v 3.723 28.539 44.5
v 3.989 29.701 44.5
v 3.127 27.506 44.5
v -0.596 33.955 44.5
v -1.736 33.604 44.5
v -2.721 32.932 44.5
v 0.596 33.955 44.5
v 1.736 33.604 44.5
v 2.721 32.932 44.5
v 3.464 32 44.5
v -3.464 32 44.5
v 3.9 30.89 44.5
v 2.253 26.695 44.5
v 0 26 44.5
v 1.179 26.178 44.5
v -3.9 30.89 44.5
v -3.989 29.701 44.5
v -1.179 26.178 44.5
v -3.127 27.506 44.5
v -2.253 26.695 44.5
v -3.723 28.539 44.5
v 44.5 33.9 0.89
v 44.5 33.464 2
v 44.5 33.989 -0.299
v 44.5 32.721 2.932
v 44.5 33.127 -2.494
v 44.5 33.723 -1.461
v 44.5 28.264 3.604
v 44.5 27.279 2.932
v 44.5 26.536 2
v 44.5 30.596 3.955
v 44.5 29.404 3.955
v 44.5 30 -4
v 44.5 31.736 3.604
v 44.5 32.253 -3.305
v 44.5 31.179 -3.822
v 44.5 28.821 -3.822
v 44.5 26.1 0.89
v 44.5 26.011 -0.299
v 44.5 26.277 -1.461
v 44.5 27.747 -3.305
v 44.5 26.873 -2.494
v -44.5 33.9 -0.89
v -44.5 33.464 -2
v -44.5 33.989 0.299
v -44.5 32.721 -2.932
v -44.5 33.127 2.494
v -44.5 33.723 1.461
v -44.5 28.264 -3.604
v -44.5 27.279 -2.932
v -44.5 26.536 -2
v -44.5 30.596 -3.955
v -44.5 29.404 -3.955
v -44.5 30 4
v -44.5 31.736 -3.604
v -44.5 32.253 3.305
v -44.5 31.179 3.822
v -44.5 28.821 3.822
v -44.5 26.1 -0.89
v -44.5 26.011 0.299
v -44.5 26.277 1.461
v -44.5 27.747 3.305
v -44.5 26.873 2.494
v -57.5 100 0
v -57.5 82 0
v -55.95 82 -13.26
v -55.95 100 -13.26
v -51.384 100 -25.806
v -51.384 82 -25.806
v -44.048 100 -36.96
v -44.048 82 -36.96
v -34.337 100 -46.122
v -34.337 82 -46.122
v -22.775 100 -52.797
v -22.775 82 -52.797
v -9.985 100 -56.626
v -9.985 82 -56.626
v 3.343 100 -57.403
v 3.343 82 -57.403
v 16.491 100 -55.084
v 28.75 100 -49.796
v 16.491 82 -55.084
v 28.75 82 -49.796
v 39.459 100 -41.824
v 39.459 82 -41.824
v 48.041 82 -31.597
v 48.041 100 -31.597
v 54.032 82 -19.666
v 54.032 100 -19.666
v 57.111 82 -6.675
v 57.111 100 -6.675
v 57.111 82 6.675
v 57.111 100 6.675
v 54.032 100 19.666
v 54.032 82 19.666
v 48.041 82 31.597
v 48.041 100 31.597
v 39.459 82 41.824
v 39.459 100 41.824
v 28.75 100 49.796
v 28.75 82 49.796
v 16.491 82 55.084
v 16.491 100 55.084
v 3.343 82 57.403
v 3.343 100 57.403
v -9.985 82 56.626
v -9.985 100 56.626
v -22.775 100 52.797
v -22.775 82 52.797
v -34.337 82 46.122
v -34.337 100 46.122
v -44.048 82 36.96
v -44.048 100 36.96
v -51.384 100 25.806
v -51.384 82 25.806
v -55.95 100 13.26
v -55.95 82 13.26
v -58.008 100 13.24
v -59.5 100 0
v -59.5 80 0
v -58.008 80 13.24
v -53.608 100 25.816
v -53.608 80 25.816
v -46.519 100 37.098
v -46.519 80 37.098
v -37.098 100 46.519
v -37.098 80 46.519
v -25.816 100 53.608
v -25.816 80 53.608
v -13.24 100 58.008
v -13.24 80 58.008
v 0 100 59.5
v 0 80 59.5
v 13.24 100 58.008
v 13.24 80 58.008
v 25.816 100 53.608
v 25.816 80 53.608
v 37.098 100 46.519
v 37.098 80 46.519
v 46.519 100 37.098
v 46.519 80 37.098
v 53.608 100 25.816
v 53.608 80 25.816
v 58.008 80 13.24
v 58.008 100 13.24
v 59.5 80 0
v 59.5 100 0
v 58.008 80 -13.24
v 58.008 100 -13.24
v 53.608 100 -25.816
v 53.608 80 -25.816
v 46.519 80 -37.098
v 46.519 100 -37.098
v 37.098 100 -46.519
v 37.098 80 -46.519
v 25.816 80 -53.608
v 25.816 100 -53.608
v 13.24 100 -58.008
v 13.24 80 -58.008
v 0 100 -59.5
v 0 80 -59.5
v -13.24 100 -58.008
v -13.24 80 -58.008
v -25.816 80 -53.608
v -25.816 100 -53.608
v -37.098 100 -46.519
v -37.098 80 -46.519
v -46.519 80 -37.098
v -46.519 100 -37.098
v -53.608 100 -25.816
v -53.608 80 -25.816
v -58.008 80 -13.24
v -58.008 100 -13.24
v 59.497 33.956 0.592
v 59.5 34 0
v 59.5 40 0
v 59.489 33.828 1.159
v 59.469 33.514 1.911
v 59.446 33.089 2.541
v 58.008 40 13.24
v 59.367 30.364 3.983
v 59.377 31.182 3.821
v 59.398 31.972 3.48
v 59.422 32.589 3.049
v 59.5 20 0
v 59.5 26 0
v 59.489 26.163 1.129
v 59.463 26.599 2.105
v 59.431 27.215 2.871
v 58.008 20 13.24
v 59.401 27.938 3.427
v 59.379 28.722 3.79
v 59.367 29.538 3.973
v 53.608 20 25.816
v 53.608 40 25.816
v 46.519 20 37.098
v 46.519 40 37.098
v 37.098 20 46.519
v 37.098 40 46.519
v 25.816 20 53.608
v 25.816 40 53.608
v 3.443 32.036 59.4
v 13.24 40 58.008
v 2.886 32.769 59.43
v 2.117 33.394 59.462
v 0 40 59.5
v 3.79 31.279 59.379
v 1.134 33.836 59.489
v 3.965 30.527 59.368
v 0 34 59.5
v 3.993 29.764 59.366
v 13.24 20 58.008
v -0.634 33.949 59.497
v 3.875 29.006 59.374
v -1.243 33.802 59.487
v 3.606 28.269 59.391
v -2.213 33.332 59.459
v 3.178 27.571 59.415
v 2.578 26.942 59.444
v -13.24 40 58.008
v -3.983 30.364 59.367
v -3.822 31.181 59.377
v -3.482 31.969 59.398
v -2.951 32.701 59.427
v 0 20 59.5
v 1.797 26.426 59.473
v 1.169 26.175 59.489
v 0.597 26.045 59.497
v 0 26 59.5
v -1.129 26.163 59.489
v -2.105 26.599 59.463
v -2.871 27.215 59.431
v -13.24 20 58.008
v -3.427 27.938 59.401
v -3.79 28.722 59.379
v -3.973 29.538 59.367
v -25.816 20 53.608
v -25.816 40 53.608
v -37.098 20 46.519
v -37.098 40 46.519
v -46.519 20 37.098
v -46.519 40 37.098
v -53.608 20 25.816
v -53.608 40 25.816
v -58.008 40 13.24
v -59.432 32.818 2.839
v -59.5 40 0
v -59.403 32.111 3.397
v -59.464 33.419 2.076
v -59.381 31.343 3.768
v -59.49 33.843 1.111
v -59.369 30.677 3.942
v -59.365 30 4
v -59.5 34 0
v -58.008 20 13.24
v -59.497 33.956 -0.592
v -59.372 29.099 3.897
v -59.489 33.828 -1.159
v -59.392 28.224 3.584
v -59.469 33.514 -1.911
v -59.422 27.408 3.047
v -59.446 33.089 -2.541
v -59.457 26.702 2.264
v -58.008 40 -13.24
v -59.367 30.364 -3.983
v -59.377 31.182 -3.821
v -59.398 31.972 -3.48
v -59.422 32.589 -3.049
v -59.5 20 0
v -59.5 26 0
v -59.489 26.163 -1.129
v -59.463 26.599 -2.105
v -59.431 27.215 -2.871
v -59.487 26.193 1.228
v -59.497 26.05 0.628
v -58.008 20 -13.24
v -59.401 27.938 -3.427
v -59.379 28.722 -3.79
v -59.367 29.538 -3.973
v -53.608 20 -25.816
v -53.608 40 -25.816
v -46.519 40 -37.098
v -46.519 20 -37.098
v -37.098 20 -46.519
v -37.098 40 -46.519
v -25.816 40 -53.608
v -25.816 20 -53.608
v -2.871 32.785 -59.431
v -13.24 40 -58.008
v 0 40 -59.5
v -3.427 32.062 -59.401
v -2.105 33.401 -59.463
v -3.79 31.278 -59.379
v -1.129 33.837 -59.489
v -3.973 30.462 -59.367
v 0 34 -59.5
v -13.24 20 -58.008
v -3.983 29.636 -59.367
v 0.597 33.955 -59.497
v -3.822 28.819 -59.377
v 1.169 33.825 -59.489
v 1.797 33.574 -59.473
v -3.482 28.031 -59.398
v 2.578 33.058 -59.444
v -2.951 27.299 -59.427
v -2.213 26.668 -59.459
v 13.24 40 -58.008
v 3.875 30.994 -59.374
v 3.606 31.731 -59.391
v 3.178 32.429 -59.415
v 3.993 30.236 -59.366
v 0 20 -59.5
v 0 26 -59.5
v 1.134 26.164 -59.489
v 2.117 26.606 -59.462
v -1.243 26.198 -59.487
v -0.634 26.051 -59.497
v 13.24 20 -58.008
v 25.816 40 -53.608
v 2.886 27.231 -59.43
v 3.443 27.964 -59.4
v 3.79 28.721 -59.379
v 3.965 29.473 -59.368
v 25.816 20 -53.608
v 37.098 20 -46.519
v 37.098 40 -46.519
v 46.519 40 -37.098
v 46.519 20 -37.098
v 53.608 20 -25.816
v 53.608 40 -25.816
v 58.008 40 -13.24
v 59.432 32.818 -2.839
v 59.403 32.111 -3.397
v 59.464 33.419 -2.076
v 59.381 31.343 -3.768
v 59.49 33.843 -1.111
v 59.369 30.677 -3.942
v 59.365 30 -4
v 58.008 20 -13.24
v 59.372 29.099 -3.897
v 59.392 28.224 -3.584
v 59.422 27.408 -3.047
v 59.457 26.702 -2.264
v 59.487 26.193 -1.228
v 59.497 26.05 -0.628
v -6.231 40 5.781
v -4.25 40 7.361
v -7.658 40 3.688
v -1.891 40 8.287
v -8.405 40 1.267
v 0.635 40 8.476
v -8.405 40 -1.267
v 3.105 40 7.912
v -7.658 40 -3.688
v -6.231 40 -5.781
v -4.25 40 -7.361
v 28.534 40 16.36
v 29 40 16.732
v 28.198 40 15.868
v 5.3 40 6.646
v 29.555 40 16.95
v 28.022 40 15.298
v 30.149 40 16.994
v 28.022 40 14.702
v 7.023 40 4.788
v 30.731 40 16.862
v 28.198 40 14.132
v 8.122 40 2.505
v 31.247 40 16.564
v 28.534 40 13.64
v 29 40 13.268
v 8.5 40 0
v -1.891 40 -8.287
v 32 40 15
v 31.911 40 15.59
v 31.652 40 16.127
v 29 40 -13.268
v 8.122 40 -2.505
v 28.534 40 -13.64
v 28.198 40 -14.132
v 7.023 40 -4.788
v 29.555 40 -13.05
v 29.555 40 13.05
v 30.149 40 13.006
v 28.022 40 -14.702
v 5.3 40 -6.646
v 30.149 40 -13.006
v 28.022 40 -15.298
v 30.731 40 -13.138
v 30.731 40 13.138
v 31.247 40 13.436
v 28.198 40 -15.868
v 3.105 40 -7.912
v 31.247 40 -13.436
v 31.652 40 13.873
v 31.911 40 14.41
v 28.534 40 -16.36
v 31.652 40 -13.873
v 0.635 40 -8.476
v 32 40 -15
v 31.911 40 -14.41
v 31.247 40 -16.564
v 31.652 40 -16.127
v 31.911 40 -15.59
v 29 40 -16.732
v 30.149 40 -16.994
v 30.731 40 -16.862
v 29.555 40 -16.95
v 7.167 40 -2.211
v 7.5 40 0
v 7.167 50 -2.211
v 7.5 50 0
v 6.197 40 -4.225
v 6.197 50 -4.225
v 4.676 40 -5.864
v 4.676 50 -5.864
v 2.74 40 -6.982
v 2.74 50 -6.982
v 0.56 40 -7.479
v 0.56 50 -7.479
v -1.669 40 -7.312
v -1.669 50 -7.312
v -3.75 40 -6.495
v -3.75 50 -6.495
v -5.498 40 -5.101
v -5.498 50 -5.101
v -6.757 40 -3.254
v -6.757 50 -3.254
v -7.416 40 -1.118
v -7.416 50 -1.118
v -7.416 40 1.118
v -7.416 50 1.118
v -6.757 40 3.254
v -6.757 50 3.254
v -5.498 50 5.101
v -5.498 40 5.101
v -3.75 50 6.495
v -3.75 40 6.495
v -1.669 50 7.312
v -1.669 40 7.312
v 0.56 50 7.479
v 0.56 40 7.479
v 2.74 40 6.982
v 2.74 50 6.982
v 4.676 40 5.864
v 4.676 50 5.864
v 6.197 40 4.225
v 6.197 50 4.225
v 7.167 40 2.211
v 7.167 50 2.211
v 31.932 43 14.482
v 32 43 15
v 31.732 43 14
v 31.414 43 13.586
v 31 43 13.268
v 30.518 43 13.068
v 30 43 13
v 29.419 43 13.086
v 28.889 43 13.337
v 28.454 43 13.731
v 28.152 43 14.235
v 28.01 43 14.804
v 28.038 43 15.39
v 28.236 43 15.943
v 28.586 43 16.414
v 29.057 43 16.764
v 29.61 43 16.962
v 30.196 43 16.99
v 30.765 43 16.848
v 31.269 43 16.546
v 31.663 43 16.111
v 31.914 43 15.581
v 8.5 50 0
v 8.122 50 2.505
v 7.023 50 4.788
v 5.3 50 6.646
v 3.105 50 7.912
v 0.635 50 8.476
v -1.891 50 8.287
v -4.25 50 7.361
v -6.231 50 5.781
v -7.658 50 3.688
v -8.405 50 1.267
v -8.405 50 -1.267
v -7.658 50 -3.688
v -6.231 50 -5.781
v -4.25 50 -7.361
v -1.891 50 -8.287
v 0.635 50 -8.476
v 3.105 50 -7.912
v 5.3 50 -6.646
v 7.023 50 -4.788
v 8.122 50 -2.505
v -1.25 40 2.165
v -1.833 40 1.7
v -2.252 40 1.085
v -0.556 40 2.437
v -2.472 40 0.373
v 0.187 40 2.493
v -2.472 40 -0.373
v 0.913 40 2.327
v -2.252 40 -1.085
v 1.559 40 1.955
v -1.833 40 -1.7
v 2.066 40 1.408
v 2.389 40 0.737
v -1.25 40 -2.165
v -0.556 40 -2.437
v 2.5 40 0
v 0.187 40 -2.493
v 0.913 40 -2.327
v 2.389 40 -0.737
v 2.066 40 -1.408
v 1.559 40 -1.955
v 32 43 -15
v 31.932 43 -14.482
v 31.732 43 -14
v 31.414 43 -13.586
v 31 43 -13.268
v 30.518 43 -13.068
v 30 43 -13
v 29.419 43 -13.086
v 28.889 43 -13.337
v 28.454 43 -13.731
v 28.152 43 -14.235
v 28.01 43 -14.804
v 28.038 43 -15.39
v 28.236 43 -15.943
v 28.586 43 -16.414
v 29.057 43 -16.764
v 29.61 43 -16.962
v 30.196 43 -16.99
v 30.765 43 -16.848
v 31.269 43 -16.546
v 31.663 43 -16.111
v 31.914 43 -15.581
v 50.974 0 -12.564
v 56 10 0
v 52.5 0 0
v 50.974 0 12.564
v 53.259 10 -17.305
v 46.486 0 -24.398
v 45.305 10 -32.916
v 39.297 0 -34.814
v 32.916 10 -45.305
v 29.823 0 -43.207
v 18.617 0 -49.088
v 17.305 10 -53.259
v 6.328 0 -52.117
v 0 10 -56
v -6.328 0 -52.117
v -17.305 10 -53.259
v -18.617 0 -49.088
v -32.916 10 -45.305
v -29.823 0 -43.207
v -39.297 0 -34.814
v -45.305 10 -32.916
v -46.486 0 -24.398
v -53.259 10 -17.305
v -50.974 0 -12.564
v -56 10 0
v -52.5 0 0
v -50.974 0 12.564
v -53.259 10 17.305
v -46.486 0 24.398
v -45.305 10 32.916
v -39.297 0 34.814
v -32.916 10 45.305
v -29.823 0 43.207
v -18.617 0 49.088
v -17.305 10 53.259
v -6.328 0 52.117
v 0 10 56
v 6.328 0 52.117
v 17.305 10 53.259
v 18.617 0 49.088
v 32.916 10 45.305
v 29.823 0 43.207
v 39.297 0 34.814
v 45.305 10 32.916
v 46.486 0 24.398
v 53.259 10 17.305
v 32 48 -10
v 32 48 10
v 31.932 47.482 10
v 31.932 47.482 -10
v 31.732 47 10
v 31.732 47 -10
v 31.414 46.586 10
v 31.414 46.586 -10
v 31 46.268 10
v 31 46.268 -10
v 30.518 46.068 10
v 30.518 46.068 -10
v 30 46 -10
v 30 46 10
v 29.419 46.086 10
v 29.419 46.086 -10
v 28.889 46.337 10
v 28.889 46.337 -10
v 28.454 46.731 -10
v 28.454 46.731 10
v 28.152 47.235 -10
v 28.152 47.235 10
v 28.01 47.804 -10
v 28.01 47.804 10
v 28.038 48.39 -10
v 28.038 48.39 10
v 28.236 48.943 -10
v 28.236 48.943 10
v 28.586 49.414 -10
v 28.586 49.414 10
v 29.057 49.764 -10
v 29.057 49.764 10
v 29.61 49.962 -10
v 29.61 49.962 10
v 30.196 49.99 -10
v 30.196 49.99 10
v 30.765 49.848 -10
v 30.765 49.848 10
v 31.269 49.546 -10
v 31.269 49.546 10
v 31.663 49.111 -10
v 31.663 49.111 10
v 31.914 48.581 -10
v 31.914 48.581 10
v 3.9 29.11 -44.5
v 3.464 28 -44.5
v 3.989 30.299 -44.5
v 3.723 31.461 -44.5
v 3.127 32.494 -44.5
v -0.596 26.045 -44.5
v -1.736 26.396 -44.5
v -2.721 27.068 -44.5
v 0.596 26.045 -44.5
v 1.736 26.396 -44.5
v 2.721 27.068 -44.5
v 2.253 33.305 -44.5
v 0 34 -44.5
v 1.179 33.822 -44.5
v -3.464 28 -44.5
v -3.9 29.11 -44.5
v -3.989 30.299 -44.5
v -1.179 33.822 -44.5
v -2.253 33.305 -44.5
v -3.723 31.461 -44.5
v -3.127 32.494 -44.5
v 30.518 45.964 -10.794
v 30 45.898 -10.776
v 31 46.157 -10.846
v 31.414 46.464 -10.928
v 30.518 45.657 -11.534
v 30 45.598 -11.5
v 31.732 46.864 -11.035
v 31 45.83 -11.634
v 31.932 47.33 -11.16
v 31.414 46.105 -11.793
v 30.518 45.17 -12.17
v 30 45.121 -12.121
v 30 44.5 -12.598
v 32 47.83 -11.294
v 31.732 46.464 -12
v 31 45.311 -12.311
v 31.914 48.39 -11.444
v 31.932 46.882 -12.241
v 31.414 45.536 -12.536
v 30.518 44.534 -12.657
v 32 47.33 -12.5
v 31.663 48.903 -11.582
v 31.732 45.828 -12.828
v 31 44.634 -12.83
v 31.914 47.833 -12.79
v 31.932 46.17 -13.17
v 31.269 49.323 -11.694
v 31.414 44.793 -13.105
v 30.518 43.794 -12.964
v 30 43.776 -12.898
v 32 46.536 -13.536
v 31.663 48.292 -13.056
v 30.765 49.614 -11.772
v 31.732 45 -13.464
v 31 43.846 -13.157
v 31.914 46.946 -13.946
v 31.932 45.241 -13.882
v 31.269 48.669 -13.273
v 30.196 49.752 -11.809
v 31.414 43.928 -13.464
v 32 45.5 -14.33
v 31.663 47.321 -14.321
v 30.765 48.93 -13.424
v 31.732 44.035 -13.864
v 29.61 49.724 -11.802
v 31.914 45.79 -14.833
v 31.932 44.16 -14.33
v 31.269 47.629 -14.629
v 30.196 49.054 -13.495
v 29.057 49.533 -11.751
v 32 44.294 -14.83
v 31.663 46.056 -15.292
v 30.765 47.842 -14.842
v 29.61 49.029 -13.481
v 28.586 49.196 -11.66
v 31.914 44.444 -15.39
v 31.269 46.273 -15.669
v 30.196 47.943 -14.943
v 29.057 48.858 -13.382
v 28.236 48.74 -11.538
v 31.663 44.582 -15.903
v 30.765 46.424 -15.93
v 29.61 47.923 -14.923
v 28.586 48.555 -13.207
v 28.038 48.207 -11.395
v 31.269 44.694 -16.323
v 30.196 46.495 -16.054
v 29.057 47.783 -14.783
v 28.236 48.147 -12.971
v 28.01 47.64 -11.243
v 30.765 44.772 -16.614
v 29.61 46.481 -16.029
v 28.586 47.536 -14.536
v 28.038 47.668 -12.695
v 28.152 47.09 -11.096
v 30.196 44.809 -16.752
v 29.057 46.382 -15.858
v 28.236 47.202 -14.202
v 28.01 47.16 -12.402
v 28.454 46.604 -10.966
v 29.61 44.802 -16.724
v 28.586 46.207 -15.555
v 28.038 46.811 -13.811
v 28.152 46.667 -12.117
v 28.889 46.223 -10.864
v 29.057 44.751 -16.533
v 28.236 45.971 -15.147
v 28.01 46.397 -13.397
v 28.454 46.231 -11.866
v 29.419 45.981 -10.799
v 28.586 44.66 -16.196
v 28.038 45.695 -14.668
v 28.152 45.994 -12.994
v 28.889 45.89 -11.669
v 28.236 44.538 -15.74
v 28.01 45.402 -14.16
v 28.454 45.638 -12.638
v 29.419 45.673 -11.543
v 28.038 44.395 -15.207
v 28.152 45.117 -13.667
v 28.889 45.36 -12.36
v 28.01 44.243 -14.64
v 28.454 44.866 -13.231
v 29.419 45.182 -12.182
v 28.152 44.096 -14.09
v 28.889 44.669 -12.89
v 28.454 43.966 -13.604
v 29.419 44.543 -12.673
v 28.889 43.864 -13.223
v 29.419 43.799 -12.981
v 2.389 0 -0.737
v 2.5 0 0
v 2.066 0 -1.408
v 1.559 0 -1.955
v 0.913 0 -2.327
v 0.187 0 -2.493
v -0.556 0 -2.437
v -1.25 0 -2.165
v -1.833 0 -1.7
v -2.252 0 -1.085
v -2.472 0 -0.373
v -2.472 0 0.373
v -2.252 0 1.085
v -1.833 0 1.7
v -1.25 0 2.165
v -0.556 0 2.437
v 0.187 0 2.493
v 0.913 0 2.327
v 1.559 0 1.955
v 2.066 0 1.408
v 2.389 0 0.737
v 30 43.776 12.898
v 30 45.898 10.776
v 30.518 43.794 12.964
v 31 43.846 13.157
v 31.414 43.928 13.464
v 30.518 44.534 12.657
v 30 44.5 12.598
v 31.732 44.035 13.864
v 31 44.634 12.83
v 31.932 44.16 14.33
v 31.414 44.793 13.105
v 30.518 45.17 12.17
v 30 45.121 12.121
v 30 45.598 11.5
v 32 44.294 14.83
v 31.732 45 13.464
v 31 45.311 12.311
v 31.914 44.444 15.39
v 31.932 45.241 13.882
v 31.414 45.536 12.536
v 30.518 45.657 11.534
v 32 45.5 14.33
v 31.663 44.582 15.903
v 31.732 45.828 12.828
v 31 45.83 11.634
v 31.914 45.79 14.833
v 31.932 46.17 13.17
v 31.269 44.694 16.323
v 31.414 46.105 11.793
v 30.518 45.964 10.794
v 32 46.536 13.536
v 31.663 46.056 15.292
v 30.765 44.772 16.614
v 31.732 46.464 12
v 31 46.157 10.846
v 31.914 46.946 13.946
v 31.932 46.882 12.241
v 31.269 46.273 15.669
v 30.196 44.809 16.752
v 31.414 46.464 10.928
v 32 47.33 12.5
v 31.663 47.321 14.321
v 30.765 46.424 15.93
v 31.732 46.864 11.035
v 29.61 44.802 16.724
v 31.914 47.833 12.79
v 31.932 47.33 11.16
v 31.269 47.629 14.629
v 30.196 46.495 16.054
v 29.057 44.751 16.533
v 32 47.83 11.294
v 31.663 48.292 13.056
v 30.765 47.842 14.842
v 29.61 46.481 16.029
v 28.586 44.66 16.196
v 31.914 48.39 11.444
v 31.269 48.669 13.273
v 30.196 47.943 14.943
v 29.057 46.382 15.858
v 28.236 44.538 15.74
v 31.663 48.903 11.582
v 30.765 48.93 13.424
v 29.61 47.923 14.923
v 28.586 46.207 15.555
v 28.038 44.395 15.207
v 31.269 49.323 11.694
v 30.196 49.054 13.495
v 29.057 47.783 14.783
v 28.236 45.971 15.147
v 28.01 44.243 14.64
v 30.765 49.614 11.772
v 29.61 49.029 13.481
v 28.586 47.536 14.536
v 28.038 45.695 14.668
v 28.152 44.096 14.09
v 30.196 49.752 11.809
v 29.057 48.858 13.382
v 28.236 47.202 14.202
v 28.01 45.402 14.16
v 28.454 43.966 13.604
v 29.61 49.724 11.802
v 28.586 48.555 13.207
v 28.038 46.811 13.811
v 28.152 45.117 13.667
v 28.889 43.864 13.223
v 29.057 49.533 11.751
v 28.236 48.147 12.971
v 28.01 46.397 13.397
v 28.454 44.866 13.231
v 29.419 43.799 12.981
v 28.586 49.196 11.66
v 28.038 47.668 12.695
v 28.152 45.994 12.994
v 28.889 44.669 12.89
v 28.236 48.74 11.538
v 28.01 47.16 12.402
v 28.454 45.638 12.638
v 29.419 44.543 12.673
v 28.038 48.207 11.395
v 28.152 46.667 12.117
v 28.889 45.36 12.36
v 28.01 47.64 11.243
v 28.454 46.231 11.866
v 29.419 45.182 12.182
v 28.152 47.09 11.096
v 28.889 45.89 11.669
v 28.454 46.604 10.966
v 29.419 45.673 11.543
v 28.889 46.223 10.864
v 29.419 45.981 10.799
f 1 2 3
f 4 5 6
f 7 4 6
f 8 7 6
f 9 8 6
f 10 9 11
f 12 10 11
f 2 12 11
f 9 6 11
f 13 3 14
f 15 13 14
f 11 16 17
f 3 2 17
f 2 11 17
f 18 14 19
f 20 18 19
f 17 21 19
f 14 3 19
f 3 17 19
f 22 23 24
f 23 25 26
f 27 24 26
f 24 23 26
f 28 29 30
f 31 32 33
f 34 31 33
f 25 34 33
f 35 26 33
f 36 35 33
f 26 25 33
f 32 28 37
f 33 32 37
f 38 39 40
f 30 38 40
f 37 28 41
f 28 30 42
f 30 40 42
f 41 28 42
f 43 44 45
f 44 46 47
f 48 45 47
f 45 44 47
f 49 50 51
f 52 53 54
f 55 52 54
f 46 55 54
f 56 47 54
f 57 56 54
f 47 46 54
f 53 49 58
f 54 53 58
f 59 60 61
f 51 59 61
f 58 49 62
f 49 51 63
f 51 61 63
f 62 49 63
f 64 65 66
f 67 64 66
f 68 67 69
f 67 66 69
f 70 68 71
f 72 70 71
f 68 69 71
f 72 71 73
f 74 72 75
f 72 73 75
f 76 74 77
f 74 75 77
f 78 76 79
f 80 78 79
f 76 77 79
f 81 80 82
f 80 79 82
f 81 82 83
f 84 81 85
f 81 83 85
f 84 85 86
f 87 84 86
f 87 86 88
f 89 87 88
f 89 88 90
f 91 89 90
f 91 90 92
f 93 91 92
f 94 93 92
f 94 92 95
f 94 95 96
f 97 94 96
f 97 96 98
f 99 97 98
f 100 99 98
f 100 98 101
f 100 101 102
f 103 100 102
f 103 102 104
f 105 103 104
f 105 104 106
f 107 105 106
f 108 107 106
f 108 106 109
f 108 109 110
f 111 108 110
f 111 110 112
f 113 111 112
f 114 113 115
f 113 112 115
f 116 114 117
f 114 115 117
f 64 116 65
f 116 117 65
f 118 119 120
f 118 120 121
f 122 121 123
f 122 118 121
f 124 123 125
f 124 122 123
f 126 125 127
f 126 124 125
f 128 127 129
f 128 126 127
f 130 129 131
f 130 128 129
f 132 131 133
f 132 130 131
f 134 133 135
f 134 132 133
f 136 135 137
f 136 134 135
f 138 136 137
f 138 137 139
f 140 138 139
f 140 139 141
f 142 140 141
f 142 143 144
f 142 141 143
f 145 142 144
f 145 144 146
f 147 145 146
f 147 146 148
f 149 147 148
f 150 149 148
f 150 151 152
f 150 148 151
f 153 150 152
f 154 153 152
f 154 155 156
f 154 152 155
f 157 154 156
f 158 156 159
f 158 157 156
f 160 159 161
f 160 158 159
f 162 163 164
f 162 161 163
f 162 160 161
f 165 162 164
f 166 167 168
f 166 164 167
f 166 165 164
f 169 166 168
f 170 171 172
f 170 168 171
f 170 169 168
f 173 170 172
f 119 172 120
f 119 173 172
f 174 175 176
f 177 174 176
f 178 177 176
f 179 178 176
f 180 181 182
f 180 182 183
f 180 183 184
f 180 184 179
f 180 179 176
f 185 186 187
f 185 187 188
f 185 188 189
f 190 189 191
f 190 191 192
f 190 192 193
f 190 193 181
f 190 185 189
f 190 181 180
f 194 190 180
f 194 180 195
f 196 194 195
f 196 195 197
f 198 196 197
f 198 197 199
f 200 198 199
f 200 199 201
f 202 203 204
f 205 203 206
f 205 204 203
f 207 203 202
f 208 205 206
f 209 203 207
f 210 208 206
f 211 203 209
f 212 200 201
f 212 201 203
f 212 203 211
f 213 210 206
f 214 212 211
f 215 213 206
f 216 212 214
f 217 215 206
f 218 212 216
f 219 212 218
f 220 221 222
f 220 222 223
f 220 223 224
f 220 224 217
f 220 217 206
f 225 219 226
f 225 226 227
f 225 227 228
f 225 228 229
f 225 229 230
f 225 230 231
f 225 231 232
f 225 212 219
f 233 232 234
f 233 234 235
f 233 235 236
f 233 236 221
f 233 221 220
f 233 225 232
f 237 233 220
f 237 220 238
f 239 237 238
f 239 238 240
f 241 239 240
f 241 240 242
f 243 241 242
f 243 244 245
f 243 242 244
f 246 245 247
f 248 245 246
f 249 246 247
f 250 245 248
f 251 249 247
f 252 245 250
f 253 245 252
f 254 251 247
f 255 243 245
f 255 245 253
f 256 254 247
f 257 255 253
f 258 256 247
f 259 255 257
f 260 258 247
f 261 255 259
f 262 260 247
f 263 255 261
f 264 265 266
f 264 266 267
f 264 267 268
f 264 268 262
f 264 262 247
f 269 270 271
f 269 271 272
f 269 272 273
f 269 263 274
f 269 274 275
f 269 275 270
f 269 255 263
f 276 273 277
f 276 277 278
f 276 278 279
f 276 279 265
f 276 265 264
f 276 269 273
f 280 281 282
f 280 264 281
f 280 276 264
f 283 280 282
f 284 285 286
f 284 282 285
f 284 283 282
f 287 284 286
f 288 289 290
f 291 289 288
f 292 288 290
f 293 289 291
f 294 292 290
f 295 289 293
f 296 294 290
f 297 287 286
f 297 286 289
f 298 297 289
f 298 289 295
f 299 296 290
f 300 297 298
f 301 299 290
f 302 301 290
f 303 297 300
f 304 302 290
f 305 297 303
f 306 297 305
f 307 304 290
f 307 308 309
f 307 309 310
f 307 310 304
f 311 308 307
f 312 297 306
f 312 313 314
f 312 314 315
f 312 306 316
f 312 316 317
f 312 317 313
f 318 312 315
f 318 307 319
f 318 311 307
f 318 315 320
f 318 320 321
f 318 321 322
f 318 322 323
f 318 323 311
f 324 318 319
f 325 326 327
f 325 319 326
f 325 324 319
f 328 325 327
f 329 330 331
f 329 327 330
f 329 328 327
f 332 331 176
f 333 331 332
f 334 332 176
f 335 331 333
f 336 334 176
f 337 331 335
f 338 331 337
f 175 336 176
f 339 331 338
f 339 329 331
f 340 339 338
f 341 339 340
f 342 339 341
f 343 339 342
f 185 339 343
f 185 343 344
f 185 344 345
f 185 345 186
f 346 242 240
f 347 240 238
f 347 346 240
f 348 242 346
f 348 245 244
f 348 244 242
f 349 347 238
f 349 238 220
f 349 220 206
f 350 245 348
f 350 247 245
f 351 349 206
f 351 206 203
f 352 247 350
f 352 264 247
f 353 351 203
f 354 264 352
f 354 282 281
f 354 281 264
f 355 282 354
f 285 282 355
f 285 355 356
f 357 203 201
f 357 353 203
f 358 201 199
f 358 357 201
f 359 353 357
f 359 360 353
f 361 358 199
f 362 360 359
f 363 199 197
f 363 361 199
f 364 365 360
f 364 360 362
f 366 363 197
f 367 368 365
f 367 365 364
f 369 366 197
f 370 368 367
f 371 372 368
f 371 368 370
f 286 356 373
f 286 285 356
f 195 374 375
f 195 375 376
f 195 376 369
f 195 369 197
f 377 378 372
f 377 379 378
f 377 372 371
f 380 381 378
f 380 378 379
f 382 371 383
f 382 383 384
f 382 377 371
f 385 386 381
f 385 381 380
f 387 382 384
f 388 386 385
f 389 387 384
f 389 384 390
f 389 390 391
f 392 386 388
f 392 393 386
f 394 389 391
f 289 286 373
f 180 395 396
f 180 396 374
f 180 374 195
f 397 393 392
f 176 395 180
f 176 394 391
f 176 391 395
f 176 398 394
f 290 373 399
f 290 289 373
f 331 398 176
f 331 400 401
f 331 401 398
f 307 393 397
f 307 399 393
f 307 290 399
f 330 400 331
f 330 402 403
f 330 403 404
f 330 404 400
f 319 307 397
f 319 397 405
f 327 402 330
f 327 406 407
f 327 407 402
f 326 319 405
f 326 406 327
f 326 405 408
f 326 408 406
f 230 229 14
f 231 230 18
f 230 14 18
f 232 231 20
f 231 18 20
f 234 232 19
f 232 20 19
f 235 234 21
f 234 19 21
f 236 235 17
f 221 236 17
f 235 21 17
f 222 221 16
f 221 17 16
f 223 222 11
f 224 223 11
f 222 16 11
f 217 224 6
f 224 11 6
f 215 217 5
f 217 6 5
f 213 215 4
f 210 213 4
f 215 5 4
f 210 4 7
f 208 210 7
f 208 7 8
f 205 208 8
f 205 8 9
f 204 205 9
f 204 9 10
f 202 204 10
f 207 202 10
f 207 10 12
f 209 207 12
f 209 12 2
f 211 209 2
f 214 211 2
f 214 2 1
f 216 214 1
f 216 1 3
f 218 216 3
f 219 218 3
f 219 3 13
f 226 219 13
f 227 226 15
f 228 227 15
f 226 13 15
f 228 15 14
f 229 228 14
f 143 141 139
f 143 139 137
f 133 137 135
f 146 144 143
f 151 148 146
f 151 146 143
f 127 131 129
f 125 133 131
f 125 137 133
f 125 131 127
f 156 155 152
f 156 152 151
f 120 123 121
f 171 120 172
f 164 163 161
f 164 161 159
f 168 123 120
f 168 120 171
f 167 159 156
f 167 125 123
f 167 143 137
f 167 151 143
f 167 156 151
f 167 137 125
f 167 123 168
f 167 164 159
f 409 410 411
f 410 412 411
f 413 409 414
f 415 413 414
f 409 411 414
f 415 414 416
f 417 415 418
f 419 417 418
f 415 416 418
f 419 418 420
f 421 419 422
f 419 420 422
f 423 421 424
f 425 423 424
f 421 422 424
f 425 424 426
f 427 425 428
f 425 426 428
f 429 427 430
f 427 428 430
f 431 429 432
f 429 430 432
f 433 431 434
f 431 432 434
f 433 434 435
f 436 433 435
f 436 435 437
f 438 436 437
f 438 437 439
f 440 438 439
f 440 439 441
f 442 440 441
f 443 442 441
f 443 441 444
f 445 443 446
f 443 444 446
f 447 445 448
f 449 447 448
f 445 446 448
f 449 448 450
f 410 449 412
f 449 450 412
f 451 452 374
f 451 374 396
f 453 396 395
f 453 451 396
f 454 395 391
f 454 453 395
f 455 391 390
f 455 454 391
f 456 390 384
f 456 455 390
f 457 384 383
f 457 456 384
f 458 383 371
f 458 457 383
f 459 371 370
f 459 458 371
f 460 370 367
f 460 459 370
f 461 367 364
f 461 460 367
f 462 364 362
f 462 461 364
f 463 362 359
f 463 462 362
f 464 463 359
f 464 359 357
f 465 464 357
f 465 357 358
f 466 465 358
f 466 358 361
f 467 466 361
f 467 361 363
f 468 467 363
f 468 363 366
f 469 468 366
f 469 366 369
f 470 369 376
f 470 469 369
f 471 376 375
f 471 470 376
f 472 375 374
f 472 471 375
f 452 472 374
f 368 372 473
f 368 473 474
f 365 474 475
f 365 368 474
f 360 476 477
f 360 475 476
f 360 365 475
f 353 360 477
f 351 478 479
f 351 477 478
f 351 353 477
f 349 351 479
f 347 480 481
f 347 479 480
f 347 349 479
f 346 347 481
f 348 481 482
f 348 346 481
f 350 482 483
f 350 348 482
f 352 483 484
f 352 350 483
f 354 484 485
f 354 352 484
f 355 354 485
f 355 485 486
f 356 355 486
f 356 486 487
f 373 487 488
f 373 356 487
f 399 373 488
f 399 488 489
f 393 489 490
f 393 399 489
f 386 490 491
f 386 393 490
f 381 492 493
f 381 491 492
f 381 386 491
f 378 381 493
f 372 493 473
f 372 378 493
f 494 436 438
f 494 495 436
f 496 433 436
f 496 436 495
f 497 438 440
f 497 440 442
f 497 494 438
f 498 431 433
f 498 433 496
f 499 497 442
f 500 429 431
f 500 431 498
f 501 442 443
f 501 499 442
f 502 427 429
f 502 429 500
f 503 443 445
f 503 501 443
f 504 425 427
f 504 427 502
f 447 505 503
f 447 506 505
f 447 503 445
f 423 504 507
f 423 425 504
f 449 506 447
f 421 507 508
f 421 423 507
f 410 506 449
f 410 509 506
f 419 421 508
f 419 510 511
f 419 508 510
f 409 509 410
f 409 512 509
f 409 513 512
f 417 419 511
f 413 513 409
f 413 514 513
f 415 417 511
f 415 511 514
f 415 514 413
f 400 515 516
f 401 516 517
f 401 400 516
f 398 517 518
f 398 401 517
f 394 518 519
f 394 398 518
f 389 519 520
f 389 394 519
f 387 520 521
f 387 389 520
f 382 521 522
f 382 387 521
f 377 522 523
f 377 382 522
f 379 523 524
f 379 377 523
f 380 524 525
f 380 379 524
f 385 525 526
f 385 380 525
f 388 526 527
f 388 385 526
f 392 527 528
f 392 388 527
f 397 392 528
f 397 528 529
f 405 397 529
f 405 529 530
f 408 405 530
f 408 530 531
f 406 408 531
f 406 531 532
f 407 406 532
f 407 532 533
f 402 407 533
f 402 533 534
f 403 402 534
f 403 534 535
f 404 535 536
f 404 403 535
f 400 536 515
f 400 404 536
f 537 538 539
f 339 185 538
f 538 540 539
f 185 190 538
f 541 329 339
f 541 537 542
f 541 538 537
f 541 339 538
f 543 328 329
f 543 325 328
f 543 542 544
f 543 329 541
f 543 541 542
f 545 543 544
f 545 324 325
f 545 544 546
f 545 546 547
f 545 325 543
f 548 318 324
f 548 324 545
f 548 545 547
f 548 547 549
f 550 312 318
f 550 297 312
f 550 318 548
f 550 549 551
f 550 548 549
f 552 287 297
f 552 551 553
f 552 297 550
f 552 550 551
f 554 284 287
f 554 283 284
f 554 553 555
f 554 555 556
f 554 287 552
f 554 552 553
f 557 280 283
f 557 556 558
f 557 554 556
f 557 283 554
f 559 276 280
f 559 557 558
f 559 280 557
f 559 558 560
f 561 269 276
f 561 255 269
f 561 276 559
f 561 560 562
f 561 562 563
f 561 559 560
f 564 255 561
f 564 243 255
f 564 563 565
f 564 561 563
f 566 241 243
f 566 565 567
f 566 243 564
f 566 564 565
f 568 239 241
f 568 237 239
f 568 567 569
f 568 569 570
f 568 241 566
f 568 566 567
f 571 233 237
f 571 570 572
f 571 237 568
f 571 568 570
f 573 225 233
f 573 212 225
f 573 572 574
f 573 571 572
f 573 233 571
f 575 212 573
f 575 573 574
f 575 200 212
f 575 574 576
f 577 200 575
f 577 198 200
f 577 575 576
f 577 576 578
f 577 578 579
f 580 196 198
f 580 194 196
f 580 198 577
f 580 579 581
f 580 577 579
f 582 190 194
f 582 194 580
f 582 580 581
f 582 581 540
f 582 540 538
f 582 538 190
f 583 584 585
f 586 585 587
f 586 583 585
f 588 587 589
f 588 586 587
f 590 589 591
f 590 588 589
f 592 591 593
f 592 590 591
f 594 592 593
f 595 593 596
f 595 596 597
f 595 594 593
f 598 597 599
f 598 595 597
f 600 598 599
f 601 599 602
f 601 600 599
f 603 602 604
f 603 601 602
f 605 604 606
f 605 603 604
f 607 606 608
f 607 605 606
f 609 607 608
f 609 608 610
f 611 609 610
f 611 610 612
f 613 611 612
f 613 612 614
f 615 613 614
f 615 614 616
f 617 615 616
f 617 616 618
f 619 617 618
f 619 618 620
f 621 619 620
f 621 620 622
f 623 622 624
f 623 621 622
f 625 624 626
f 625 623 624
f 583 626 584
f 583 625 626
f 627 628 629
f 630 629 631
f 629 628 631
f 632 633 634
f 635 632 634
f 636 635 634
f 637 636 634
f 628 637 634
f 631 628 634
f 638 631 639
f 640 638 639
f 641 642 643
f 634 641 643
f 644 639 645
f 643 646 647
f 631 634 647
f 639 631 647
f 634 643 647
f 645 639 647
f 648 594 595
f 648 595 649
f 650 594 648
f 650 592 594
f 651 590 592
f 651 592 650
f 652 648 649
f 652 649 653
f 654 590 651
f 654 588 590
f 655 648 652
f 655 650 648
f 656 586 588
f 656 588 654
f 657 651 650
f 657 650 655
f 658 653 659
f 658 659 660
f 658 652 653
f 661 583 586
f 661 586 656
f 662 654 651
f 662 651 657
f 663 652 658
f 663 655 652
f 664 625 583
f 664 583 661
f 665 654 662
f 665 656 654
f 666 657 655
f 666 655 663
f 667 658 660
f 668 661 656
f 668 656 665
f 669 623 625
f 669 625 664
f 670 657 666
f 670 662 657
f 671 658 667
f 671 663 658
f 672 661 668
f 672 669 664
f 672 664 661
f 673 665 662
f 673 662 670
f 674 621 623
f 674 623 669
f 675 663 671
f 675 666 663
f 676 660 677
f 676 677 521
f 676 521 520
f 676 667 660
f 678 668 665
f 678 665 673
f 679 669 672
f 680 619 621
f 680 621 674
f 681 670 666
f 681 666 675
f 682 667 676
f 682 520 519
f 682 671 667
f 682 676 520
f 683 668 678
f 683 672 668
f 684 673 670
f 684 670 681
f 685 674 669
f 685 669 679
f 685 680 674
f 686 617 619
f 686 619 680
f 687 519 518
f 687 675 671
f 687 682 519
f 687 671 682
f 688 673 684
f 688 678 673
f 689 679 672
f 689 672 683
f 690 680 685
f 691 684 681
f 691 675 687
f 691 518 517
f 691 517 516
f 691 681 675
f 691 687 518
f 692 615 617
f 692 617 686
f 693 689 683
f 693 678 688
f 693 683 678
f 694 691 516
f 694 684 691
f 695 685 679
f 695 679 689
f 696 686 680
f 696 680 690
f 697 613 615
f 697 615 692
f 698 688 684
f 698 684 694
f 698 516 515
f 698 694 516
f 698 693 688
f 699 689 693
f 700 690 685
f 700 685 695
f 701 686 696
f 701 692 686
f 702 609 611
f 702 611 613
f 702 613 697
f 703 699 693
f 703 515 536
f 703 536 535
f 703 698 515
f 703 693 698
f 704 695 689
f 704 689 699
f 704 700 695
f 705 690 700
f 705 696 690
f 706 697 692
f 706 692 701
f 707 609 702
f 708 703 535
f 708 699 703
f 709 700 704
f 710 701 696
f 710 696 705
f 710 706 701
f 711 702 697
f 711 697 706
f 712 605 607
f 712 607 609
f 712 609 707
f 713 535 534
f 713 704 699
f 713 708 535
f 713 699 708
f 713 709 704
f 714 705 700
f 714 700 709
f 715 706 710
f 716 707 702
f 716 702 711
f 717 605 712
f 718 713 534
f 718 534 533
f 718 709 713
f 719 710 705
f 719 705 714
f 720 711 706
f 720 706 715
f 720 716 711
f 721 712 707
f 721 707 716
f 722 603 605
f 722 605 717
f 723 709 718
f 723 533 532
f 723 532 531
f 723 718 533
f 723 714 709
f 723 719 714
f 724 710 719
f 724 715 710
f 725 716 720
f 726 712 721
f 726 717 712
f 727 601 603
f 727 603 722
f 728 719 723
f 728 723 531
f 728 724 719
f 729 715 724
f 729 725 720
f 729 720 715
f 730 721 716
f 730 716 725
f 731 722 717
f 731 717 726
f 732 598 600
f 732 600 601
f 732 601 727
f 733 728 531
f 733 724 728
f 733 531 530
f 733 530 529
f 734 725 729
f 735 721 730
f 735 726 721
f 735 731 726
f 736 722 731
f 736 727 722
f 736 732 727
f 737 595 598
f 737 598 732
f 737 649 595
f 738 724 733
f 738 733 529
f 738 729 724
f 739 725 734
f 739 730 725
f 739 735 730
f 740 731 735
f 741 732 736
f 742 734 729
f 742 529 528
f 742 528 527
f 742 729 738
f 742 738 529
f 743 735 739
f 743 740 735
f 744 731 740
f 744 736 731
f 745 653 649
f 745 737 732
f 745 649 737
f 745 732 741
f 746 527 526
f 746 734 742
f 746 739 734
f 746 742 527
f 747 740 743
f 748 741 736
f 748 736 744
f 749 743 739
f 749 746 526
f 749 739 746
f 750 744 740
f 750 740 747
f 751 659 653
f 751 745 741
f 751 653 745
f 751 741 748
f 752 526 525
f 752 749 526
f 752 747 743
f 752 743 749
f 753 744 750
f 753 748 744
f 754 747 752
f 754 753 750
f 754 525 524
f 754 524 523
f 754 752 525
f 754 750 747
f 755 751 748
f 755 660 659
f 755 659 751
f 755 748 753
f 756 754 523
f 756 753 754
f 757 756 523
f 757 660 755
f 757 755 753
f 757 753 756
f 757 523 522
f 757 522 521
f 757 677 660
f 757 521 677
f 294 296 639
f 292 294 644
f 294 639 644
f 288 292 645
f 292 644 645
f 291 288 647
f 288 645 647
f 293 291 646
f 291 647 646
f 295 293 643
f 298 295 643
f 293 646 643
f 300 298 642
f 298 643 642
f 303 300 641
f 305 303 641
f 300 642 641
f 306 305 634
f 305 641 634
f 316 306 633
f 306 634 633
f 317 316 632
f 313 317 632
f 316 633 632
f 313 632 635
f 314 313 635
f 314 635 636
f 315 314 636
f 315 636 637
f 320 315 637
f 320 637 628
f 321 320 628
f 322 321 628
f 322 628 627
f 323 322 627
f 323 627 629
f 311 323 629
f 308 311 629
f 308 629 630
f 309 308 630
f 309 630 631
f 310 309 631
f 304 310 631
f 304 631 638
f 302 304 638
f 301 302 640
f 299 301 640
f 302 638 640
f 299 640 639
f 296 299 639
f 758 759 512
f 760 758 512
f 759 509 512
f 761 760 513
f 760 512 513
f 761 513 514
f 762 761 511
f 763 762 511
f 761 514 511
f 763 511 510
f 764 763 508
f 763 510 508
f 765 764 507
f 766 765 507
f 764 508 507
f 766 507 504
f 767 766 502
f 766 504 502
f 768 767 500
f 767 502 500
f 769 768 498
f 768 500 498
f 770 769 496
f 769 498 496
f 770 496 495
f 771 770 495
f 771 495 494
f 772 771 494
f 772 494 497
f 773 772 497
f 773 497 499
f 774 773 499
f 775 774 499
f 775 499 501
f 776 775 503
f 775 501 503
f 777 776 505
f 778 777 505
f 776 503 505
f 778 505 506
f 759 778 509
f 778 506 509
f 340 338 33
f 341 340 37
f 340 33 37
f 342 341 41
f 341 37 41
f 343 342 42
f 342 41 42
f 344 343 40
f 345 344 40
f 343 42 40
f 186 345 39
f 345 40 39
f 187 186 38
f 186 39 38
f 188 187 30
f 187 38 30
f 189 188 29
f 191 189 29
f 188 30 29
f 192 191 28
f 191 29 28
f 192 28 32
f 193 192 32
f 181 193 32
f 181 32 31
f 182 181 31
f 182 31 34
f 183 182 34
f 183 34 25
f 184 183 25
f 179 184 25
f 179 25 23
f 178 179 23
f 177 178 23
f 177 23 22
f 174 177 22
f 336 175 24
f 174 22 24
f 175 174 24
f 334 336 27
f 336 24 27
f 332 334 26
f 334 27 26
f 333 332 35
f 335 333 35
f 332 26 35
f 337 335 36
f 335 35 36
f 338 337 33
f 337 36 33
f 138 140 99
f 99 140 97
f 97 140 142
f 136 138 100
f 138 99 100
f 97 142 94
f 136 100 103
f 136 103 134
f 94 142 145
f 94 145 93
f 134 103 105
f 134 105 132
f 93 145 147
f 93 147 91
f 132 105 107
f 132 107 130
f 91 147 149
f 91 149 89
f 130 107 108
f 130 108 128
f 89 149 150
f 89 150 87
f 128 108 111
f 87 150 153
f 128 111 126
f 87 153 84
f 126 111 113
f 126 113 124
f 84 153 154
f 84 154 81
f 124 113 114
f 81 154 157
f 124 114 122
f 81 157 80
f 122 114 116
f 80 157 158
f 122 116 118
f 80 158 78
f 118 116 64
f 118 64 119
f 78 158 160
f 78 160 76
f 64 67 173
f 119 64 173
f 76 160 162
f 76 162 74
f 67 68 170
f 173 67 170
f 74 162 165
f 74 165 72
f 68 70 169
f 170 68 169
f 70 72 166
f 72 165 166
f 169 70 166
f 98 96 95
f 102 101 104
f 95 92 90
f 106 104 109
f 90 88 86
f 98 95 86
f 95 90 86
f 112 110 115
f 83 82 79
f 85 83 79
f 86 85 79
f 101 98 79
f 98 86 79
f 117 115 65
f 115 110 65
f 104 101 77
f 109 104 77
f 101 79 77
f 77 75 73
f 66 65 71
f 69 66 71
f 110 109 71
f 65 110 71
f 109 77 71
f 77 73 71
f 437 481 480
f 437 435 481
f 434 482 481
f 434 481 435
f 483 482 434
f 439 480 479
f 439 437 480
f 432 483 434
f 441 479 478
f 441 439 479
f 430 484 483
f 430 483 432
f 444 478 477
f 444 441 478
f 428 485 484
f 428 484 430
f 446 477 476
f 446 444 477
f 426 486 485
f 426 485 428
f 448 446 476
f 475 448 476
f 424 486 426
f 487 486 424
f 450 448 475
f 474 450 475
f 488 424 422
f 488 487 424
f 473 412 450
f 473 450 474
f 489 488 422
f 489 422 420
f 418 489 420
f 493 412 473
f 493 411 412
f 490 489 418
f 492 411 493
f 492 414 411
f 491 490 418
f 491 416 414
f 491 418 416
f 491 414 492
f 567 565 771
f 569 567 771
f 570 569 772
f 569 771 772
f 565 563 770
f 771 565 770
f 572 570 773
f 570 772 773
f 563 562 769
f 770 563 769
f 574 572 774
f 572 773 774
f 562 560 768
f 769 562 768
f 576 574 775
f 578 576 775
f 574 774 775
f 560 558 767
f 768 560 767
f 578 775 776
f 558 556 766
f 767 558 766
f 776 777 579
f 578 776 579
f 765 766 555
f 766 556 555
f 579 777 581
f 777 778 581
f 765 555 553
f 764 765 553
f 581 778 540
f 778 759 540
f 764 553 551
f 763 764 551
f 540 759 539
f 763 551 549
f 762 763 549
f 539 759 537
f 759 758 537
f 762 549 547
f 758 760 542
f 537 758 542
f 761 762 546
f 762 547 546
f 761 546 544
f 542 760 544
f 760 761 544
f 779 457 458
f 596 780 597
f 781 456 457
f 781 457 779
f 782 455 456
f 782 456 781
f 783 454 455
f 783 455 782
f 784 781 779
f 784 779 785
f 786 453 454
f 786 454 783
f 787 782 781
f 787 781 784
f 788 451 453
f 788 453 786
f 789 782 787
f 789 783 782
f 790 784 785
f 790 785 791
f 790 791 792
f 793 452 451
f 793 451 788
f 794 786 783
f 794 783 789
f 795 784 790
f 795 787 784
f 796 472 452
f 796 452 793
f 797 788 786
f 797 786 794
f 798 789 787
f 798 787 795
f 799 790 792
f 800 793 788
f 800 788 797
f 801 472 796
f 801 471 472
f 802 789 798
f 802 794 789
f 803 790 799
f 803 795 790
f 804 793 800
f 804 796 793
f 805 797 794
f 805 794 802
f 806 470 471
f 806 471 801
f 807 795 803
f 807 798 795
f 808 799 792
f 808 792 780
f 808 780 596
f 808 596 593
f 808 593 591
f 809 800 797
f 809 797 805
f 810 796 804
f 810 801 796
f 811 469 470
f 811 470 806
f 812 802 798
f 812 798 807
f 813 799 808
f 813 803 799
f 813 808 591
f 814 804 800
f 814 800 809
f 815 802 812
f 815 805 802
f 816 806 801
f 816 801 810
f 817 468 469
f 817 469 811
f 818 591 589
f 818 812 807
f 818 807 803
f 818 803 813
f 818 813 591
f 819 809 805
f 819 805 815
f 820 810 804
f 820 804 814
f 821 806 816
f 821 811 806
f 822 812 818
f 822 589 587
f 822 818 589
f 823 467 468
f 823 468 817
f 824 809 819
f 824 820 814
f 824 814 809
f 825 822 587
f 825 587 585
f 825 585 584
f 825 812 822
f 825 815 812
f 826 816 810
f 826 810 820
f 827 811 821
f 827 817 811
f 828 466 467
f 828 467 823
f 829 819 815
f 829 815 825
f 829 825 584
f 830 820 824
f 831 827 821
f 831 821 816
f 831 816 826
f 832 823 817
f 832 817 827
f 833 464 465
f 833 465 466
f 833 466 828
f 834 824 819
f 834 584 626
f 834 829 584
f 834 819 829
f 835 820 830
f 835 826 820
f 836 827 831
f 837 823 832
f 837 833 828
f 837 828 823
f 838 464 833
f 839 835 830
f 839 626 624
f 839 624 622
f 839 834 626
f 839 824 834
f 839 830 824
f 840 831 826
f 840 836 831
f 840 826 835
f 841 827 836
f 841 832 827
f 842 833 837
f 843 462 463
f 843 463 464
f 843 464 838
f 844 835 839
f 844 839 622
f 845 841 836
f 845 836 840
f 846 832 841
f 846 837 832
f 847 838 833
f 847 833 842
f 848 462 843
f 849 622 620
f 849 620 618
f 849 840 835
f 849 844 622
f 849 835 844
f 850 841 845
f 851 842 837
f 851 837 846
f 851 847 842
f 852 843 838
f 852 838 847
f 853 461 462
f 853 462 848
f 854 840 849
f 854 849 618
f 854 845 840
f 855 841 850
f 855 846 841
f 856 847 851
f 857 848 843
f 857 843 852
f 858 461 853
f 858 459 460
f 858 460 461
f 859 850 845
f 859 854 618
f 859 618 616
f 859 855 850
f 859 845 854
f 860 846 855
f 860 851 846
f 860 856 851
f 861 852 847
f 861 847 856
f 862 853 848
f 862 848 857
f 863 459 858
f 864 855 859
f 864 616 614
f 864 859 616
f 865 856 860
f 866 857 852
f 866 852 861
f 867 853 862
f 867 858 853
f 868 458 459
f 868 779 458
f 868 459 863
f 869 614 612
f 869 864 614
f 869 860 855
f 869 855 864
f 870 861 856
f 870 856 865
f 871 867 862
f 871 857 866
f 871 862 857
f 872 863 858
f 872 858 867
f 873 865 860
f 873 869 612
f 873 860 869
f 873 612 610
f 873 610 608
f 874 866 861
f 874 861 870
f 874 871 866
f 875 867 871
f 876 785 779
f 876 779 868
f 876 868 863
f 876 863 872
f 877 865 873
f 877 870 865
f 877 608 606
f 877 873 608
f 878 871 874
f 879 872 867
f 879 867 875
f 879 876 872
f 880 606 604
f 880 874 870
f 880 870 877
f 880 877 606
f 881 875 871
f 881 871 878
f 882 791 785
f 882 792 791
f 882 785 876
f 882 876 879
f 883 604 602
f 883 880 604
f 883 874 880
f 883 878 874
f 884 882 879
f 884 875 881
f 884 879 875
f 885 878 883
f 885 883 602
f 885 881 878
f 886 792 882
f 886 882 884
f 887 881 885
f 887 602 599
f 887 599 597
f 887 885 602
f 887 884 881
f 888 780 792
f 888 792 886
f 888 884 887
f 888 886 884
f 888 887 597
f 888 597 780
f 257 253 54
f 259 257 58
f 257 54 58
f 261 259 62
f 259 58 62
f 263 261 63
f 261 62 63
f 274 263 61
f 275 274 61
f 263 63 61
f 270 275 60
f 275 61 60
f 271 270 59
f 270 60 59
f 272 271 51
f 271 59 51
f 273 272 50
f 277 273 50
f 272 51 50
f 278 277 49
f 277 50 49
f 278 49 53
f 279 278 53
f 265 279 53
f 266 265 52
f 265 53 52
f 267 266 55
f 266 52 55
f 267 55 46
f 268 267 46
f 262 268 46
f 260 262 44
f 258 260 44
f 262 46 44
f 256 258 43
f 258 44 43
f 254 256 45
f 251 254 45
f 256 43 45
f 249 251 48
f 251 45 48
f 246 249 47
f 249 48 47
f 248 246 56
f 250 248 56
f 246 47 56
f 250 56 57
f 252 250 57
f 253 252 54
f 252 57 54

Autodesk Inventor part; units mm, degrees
sketch "Sketch1" plane through (0, 0, 0) normal (0, 0, 1) x (1, 0, 0)
  line L0 (0, 0) -> (2.5, 0)
  line L1 (2.5, 0) -> (2.5, 40)
  line L2 (2.5, 40) -> (7.5, 40)
  line L3 (7.5, 40) -> (7.5, 50)
  line L4 (7.5, 50) -> (8.5, 50)
  line L5 (8.5, 50) -> (8.5, 40)
  line L6 (8.5, 40) -> (59.5, 40)
  line L7 (59.5, 40) -> (59.5, 20)
  line L8 (2.5, 0) -> (52.5, 0)
  line L9 (52.5, 0) -> (59.5, 20)
  line L10 (0, 0) -> (0, 69.9438)
  dimension "d0" = 2.5
  dimension "d1" = 40
  dimension "d2" = 5
  dimension "d3" = 10
  dimension "d4" = 1
  dimension "d5" = 10
  dimension "d6" = 51
  dimension "d7" = 20
  dimension "d8" = 50
revolve "Revolution1" add sketch "Sketch1" angle 360 about axis through (0, 0, 0) along (0, 1, 0)
sketch "Sketch2" plane through (0, 0, 0) normal (1, 0, 0) x (0, 1, 0)
  point P0 (0, 0)
sketch "Sketch3" plane through (0, 0, 0) normal (1, 0, 0) x (0, 1, 0)
  point P0 (0, 0)
ref_plane "Work Plane1" through (59.5, 30, 0) normal (1, 0, 0) x (0, 1, 0)
sketch "Sketch4" plane through (59.5, 30, 0) normal (1, 0, 0) x (0, 1, 0)
  line L0 (-30, 0) -> (0, 0)
  dimension "d10" = 30
hole "Hole1" at (59.5, 30, 0) direction (-1, 0, 0) diameter 8 depth 15
thread "Thread1"
ref_plane "Work Plane2" through (0, 30, -59.5) normal (0, 0, 1) x (1, 0, 0)
sketch "Sketch5" plane through (0, 30, -59.5) normal (0, 0, 1) x (1, 0, 0)
  line L0 (0, -30) -> (0, 0)
  dimension "d20" = 30
hole "Hole2" at (0, 30, -59.5) direction (0, 0, 1) diameter 8 depth 15
thread "Thread2"
ref_plane "Work Plane3" through (-59.5, 30, 0) normal (1, 0, 0) x (0, 1, 0)
sketch "Sketch6" plane through (-59.5, 30, 0) normal (1, 0, 0) x (0, 1, 0)
  line L0 (-30, 0) -> (0, 0)
  dimension "d30" = 30
hole "Hole3" at (-59.5, 30, 0) direction (1, 0, 0) diameter 8 depth 15
ref_plane "Work Plane4" through (0, 30, 59.5) normal (0, 0, 1) x (1, 0, 0)
sketch "Sketch7" plane through (0, 30, 59.5) normal (0, 0, 1) x (1, 0, 0)
  line L0 (0, -30) -> (0, 0)
  dimension "d38" = 30
hole "Hole4" at (0, 30, 59.5) direction (0, 0, -1) diameter 8 depth 15
thread "Thread3"
thread "Thread4"
sketch "Sketch8" plane through (0, 40, 0) normal (0, 1, 0) x (1, 0, 0)
  line L0 (0, 0) -> (30, 0)
  line L1 (30, 0) -> (30, -15)
  circle A0 centre (30, -15) radius 2
  dimension "d50" = 30
  dimension "d51" = 15
  dimension "d52" = 4
sketch3d "3D Sketch1"
  line L0 (30, 40, 15) -> (30, 43, 15)
  arc A0 (30, 43, 15) -> (30, 48, 10) centre (30, 43, 10) ccw
  line L1 (30, 48, 10) -> (30, 48, -10)
  arc A1 (30, 48, -10) -> (30, 43, -15) centre (30, 43, -10) ccw
  line L2 (30, 43, -15) -> (30, 40, -15)
  dimension "d53" = 5
  dimension "d54" = 5
sweep "Sweep1" add profiles "Sketch8" path "3D Sketch1"
sketch "Sketch9" plane through (0, 40, 0) normal (0, 1, 0) x (1, 0, 0)
  point P0 (0, 0)
sketch "Sketch10" plane through (0, 40, 0) normal (0, 1, 0) x (1, 0, 0)
  point P0 (0, 0)
sketch "Sketch11" plane through (0, 40, 0) normal (0, 1, 0) x (1, 0, 0)
  point P0 (0, 0)
sketch3d "3D Sketch2"
ref_plane "Work Plane5" through (0, 80, 0) normal (0, 0, 1) x (1, 0, 0)
sketch "Sketch12" plane through (0, 80, 0) normal (0, 0, 1) x (1, 0, 0)
  line L0 (0, 0) -> (-59.5, 0)
  line L1 (-59.5, 0) -> (-59.5, 20)
  line L2 (-59.5, 20) -> (-57.5, 20)
  line L3 (-57.5, 20) -> (-57.5, 2)
  line L4 (-57.5, 2) -> (0, 2)
  line L5 (0, 2) -> (0, 0)
  point P0 (0, -80)
  dimension "d57" = 59.5
  dimension "d58" = 20
  dimension "d59" = 2
  dimension "d60" = 18
revolve "Revolution2" add sketch "Sketch12" angle 360 about axis through (0, 82, 0) along (0, -1, 0)
equation "\"d54\" = d53"
equation "\"BendRadius\" = Thickness"
equation "\"BendReliefWidth\" = Thickness"
equation "\"BendReliefDepth\" = 0.5 * Thickness"
equation "\"CornerReliefSize\" = 4 * Thickness"
equation "\"MinimumRemnant\" = 2 * Thickness"
equation "\"TransitionRadius\" = BendRadius"
equation "\"JacobiRadiusSize\" = BendRadius"
equation "\"GapSize\" = Thickness"
equation "\"Thickness\" = 0.5"
properties part number "bulkhead v2"
